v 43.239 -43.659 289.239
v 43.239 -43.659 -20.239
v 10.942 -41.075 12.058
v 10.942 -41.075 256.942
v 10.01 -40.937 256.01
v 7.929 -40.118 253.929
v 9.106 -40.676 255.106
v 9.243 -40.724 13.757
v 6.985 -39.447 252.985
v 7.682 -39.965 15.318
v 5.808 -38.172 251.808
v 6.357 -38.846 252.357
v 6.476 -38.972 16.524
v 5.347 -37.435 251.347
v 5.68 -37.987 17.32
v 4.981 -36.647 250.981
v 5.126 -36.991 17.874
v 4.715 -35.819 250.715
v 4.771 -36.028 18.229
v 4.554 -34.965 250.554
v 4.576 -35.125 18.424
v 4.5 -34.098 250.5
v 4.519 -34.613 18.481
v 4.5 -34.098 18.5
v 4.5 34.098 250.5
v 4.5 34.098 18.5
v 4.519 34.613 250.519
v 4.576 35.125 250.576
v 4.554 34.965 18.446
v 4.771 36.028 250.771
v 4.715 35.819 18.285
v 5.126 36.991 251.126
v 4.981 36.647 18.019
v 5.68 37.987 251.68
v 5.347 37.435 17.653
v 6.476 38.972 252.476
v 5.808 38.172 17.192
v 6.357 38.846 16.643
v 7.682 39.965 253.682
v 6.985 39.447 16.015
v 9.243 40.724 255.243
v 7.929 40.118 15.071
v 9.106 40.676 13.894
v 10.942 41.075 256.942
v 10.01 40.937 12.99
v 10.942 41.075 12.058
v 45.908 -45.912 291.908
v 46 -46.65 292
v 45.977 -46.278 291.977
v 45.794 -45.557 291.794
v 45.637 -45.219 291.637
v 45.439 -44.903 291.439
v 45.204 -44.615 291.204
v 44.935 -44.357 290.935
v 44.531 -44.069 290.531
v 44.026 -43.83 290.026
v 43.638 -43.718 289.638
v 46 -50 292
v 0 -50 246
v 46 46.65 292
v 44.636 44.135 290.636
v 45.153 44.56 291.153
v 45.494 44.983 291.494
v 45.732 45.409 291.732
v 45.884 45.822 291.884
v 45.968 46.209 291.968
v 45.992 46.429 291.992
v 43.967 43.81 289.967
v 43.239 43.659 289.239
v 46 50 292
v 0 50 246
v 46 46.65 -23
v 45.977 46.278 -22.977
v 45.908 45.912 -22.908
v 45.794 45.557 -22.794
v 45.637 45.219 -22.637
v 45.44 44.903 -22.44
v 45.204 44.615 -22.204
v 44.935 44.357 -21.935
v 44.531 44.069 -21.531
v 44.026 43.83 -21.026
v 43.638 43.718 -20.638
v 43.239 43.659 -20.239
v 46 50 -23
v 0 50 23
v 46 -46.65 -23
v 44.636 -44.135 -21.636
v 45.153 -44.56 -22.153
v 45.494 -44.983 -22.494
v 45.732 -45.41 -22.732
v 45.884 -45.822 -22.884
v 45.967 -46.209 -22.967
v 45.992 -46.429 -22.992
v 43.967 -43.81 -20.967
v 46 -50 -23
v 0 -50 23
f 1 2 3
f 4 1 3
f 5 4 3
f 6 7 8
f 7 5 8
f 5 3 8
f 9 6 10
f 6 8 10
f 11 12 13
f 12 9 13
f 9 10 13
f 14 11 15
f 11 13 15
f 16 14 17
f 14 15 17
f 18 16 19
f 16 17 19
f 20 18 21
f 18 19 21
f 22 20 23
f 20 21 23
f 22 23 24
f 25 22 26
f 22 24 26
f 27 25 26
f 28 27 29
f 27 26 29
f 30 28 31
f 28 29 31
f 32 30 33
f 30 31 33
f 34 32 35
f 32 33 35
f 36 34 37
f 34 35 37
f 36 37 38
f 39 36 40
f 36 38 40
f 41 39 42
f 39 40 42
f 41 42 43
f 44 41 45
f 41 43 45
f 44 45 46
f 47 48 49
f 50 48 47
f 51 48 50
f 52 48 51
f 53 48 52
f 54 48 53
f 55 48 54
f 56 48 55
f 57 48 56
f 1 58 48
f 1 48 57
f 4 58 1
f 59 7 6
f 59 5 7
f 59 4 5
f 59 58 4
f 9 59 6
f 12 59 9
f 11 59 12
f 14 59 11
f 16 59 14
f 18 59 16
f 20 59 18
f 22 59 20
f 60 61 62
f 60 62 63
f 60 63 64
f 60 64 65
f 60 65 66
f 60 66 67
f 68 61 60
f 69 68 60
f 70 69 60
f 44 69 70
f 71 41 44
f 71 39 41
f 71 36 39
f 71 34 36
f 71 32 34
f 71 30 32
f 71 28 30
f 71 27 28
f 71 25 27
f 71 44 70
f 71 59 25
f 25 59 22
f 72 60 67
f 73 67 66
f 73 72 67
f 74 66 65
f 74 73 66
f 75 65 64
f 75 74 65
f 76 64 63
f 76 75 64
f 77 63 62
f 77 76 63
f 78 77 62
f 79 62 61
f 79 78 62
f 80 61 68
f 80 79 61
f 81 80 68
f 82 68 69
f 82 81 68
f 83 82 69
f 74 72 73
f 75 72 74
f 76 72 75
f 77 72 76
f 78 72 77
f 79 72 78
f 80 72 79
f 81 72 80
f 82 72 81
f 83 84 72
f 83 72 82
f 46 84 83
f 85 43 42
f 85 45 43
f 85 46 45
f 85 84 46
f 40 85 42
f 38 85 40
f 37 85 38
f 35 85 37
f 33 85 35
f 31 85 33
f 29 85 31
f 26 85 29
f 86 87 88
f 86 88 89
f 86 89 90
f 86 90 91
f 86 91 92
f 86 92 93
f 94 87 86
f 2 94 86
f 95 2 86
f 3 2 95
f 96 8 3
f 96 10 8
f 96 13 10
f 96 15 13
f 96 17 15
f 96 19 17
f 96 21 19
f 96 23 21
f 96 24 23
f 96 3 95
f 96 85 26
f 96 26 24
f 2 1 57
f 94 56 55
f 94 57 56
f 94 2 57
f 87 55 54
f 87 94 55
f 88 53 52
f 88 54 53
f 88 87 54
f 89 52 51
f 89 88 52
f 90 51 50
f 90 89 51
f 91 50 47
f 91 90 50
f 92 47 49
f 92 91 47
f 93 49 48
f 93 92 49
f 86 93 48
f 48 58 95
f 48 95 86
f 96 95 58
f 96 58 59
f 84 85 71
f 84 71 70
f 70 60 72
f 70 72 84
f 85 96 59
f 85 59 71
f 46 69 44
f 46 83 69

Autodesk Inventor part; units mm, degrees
ref_plane "Начальная плоскость" through (0, 0, -23) normal (0, 0, 1) x (1, 0, 0)
ref_plane "Конечная плоскость" through (0, 0, 292) normal (0, 0, 1) x (1, 0, 0)
sketch "Эскиз" plane through (0, 0, 0) normal (0, 0, 1) x (1, 0, 0)
  line L0 (46, -50) -> (0, -50)
  line L1 (46, -50) -> (46, -46.6496)
  line L2 (43.2392, -43.6591) -> (10.9418, -41.0753)
  line L3 (4.5, -34.0976) -> (4.5, 34.0976)
  line L4 (43.2392, 43.6591) -> (10.9418, 41.0753)
  line L5 (46, 46.6496) -> (46, 50)
  line L6 (0, 50) -> (46, 50)
  line L7 (0, -50) -> (0, 50)
  arc A0 (4.5, -34.0976) -> (10.9418, -41.0753) centre (11.5, -34.0976) ccw
  arc A1 (10.9418, 41.0753) -> (4.5, 34.0976) centre (11.5, 34.0976) ccw
  arc A2 (46, -46.6496) -> (43.2392, -43.6591) centre (43, -46.6496) ccw
  arc A3 (43.2392, 43.6591) -> (46, 46.6496) centre (43, 46.6496) ccw
  line L8 (0, 70) -> (0, -70) construction
  line L9 (-9.3169, 0) -> (55.9016, 0) construction
  point P0 (46, -43.88)
  point P1 (4.5, -40.56)
  point P2 (4.5, 40.56)
  point P3 (46, 43.88)
  dimension "d3" = 46
  dimension "d5" = 4.5
  dimension "d7" = 100
  dimension "d9" = 9.44
  dimension "d11" = 9.44
  dimension "d13" = 6.12
  dimension "d15" = 6.12
  dimension "d22" = 7
  dimension "d23" = 3
  dimension "d24" = 50
  dimension "d25" = 0
extrude "Тело" add sketch "Эскиз" along normal up to surface (315 mm away) from surface at -23
sketch "Sketch3" plane through (0, 0, 0) normal (0, 0, 1) x (1, 0, 0)
  line L0 (0, 0) -> (10, 0)
ref_plane "Work Plane7" through (0, 0, 0) normal (0, -1, 0) x (1, 0, 0)
sketch "Sketch4" plane through (0, 0, 0) normal (0, -1, 0) x (1, 0, 0)
  line L0 (-2, -23) -> (12, -23)
  line L1 (-2, 292) -> (12, 292)
  dimension "d29" = 315
ref_plane "РабПлоскость8" through (46, 0, 292) normal (-0.7071, 0, 0.7071) x (0.7071, 0, 0.7071)
split "Разделение1" plane through (46, 0, 292) removes the side toward (-0.7071, 0, 0.7071)
ref_plane "РабПлоскость9" through (46, 0, -23) normal (-0.7071, 0, -0.7071) x (-0.7071, 0, 0.7071)
split "Разделение2" plane through (46, 0, -23) removes the side toward (-0.7071, 0, -0.7071)
equation "\"d3\" = b"
equation "\"d5\" = t1"
equation "\"d7\" = ParH"
equation "\"d9\" = msp_x1 + t2"
equation "\"d11\" = msp_x1 + t2"
equation "\"d13\" = -msp_x2 + t2"
equation "\"d15\" = -msp_x2 + t2"
equation "\"d22\" = R"
equation "\"d23\" = R1"
equation "\"d24\" = 0.5 * d7"
equation "\"d16\" = G_L"
equation "\"R1\" = 3"
equation "\"R\" = 7"
equation "\"t1\" = 4.5"
equation "\"t2\" = 7.6"
equation "\"ParH\" = 100"
equation "\"b\" = 46"
equation "\"msp_x1\" = 0.04 * b"
equation "\"msp_x2\" = -0.08 * t1 + 0.04 * b"
equation "\"G_L\" = d29"
equation "\"ex\" = 0"
equation "\"G_OFFSET_START\" = 23"
equation "\"G_OFFSET_END\" = 23"
equation "\"d26\" = -G_OFFSET_START"
equation "\"d27\" = G_OFFSET_END + B_L"
equation "\"B_L\" = 269"
properties part number "Швеллер 10U-315 ГОСТ 8240-97" material "Сталь, мягкая"
